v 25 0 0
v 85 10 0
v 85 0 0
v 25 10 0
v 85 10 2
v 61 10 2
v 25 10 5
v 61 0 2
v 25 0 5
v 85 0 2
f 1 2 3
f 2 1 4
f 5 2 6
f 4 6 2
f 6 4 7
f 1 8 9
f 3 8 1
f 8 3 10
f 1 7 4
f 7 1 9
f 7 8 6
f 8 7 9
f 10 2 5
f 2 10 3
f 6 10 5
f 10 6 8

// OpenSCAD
LEN=60;
OFFSET=25;

polyhedron(
points = [[OFFSET,0,0],[OFFSET,10,0],[LEN+OFFSET,0,0],[LEN+OFFSET,10,0],[OFFSET,0,5],[OFFSET,10,5]],
triangles = [[0,1,3],[2,0,3],[3,1,5],[0,2,4],[5,1,0],[4,5,0],[2,5,4],[2,3,5]]
);
translate([OFFSET+(LEN*3/5),0,0]){
	cube([(LEN*2/5),10,2]);
}
